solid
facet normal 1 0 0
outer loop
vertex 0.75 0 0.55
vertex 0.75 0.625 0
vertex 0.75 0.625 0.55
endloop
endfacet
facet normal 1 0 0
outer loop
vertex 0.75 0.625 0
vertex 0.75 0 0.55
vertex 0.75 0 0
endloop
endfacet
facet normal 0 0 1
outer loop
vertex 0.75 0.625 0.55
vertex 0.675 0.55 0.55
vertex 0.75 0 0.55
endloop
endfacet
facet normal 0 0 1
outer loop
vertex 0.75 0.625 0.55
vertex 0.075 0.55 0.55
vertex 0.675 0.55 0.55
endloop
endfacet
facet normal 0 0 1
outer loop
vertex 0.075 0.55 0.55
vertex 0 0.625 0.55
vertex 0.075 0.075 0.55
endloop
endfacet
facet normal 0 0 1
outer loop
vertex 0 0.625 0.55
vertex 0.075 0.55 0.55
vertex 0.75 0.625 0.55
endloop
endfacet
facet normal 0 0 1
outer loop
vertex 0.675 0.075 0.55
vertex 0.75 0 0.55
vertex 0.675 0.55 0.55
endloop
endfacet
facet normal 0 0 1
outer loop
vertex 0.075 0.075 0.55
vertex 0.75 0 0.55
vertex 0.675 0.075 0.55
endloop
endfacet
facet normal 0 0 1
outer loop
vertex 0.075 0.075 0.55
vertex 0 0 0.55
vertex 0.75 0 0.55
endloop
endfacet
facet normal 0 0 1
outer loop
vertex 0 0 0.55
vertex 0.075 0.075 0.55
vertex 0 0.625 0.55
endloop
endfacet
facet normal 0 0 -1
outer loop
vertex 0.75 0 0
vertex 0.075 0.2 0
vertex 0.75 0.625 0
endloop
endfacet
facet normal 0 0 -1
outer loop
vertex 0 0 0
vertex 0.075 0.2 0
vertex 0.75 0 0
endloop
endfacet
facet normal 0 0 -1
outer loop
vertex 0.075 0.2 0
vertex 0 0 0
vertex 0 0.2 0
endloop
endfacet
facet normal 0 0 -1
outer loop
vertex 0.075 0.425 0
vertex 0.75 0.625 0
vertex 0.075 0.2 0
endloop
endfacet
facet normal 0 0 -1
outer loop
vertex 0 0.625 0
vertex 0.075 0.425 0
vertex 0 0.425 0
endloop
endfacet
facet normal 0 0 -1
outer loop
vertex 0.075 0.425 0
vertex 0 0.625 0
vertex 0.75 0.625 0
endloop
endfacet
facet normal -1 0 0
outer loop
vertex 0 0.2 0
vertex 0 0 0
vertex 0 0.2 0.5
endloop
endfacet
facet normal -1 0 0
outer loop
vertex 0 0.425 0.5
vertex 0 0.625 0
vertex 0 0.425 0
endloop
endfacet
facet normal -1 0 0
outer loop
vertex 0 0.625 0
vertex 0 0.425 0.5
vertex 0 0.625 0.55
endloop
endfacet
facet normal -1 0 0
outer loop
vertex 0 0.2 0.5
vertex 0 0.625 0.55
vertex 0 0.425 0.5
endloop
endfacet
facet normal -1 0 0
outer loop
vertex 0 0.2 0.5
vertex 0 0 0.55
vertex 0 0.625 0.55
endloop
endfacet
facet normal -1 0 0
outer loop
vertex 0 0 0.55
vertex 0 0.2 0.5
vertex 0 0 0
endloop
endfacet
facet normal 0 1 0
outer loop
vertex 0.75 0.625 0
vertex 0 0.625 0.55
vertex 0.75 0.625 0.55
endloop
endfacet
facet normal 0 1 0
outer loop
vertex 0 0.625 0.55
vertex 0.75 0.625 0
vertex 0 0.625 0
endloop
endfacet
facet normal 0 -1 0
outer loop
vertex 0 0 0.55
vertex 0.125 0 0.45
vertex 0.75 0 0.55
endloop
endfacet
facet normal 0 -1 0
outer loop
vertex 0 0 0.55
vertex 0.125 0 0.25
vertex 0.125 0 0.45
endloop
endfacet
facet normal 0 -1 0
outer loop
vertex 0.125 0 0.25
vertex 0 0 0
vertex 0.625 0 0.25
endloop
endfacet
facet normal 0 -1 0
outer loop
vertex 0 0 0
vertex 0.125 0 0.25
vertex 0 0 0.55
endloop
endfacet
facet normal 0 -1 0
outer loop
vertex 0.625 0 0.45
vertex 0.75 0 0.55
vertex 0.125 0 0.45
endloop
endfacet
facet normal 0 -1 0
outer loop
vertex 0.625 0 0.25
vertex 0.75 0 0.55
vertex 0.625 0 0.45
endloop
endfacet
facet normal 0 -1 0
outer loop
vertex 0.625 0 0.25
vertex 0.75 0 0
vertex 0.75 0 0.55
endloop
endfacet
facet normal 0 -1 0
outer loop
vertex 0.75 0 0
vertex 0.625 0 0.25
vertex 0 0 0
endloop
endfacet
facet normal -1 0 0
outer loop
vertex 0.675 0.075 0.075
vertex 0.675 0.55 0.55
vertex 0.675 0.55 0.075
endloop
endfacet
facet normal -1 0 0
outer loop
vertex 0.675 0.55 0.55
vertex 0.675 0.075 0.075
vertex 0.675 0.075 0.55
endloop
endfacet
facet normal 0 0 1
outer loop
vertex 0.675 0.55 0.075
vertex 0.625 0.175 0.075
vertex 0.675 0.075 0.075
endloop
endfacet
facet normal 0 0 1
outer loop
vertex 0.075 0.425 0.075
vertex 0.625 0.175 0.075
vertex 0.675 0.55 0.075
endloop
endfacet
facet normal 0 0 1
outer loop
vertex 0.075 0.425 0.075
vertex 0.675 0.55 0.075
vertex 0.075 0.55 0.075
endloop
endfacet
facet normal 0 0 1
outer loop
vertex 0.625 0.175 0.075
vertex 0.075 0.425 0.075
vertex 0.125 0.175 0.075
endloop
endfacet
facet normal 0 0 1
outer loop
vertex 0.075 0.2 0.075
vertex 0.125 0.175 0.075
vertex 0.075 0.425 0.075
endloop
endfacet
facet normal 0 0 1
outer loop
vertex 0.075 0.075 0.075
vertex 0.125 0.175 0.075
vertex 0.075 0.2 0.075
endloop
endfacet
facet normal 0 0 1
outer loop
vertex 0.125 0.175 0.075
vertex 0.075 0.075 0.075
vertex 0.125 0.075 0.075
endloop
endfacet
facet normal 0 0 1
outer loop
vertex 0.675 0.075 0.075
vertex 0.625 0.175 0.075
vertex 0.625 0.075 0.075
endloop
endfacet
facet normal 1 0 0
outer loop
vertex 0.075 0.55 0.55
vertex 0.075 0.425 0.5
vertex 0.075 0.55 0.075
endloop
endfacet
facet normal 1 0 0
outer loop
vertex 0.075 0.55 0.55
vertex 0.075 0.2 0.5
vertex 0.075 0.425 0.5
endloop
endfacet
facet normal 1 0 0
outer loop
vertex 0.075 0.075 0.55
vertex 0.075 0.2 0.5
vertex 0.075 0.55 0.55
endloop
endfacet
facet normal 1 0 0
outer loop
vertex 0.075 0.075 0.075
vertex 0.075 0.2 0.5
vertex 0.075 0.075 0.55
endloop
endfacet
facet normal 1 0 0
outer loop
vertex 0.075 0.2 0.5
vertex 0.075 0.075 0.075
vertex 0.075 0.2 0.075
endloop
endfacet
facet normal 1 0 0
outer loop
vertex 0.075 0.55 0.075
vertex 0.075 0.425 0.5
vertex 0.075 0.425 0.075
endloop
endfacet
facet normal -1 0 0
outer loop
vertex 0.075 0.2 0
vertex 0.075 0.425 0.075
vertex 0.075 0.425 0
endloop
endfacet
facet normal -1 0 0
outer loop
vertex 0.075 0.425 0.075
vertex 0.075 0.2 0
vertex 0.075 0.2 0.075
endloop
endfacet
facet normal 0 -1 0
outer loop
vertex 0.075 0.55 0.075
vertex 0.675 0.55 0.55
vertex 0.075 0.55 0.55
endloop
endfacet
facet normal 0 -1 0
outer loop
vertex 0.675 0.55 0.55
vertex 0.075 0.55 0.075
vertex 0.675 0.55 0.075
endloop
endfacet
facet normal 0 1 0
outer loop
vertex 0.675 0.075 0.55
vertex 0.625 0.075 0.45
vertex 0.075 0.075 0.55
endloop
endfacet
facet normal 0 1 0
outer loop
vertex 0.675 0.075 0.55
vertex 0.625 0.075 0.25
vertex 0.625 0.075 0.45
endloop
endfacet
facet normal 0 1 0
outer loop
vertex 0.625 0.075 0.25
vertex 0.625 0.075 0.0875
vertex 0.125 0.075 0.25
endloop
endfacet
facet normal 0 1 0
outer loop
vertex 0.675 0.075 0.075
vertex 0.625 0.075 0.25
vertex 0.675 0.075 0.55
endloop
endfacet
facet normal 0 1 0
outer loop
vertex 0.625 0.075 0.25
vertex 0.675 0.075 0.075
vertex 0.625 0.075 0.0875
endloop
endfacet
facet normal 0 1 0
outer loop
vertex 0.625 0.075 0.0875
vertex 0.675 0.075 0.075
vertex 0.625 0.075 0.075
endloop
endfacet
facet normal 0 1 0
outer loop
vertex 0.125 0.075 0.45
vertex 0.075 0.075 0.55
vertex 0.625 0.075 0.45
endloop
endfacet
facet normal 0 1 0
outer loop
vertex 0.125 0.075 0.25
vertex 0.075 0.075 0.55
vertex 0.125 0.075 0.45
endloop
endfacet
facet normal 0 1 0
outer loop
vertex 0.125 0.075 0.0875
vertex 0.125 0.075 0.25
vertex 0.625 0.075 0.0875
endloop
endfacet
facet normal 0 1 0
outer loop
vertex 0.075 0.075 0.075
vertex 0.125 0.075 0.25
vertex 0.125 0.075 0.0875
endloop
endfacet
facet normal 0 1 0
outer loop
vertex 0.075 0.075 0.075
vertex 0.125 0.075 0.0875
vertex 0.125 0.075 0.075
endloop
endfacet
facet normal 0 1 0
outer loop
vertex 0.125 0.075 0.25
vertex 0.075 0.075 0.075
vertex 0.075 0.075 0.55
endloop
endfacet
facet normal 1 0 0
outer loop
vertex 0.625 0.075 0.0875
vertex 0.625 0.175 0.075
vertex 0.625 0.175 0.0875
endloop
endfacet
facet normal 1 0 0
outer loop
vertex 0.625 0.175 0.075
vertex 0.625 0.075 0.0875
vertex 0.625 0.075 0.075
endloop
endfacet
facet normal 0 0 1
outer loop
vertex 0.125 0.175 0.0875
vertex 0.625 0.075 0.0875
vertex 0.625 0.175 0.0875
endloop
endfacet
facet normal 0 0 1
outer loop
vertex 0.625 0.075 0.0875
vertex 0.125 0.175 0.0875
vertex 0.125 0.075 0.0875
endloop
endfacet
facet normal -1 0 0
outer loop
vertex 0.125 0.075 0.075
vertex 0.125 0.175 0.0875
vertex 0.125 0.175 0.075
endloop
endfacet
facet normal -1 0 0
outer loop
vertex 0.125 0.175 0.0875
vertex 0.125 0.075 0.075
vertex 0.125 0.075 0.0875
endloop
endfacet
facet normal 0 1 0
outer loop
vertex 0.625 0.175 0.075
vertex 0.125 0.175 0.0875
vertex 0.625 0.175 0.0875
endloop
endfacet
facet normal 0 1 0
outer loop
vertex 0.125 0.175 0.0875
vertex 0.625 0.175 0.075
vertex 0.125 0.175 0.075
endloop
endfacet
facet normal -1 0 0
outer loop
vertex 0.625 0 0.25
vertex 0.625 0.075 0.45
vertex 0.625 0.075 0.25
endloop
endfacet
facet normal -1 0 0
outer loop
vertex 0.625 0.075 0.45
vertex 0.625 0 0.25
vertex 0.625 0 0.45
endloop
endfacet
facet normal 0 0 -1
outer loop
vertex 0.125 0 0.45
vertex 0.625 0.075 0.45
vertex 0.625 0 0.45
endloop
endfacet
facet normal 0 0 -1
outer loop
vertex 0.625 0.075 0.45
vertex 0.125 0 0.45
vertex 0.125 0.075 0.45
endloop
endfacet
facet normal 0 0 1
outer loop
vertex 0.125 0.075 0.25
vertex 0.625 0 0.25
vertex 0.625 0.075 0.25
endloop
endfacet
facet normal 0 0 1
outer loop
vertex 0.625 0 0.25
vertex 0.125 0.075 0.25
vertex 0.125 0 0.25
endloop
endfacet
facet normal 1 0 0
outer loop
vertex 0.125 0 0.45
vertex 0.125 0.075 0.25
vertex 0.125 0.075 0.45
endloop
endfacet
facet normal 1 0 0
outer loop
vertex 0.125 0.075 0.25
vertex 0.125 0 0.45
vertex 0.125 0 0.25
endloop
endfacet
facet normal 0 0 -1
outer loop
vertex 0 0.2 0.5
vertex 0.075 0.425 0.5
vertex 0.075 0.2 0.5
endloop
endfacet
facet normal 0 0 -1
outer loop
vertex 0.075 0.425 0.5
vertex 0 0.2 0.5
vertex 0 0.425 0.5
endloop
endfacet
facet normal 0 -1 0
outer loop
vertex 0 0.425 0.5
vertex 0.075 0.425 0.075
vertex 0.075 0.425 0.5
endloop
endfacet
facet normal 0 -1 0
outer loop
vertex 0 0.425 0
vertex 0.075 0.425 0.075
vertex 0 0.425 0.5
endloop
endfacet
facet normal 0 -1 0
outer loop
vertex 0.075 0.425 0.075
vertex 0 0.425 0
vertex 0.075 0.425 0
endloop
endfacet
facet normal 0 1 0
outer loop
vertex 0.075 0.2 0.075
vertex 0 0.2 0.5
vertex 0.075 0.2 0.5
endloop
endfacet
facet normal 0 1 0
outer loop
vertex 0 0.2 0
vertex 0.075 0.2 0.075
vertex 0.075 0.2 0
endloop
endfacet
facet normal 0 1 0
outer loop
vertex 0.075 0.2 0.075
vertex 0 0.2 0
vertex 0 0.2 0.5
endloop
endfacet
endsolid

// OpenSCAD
// Outer dimensions of the enclosure
outer_x = 0.75;
outer_y = 0.625;
outer_z = 0.55;

// Wall and floor thickness (inferred from cut depths)
wall_t = 0.075;
floor_t = 0.075;

// Front wall cut: horizontal rectangular opening
fc_length = 0.5;
fc_side_margin = 0.125;
fc_z_lo = 0.25;
fc_z_hi = 0.45;
fc_depth = 0.075;

// Left side opening: vertical rectangular cut
ls_depth = 0.075;
ls_y_start = 0.2;
ls_y_span = 0.225;
ls_z_top = 0.5;

// Internal front ledge
ledge_length = 0.5;
ledge_width = 0.1;
ledge_x_start = 0.125;
ledge_thickness = 0.0125;

eps = 0.001;
$fn = 50;

module hollow_enclosure() {
    difference() {
        cube([outer_x, outer_y, outer_z]);
        translate([wall_t, wall_t, floor_t])
            cube([outer_x - 2*wall_t,
                  outer_y - 2*wall_t,
                  outer_z - floor_t + eps]);
    }
}

module front_wall_cut() {
    translate([fc_side_margin, -eps, fc_z_lo])
        cube([fc_length, fc_depth + eps, fc_z_hi - fc_z_lo]);
}

module left_side_opening() {
    translate([-eps, ls_y_start, -eps])
        cube([ls_depth + eps, ls_y_span, ls_z_top + eps]);
}

module internal_ledge() {
    translate([ledge_x_start, wall_t, floor_t])
        cube([ledge_length, ledge_width, ledge_thickness]);
}

difference() {
    union() {
        hollow_enclosure();
        internal_ledge();
    }
    front_wall_cut();
    left_side_opening();
}
